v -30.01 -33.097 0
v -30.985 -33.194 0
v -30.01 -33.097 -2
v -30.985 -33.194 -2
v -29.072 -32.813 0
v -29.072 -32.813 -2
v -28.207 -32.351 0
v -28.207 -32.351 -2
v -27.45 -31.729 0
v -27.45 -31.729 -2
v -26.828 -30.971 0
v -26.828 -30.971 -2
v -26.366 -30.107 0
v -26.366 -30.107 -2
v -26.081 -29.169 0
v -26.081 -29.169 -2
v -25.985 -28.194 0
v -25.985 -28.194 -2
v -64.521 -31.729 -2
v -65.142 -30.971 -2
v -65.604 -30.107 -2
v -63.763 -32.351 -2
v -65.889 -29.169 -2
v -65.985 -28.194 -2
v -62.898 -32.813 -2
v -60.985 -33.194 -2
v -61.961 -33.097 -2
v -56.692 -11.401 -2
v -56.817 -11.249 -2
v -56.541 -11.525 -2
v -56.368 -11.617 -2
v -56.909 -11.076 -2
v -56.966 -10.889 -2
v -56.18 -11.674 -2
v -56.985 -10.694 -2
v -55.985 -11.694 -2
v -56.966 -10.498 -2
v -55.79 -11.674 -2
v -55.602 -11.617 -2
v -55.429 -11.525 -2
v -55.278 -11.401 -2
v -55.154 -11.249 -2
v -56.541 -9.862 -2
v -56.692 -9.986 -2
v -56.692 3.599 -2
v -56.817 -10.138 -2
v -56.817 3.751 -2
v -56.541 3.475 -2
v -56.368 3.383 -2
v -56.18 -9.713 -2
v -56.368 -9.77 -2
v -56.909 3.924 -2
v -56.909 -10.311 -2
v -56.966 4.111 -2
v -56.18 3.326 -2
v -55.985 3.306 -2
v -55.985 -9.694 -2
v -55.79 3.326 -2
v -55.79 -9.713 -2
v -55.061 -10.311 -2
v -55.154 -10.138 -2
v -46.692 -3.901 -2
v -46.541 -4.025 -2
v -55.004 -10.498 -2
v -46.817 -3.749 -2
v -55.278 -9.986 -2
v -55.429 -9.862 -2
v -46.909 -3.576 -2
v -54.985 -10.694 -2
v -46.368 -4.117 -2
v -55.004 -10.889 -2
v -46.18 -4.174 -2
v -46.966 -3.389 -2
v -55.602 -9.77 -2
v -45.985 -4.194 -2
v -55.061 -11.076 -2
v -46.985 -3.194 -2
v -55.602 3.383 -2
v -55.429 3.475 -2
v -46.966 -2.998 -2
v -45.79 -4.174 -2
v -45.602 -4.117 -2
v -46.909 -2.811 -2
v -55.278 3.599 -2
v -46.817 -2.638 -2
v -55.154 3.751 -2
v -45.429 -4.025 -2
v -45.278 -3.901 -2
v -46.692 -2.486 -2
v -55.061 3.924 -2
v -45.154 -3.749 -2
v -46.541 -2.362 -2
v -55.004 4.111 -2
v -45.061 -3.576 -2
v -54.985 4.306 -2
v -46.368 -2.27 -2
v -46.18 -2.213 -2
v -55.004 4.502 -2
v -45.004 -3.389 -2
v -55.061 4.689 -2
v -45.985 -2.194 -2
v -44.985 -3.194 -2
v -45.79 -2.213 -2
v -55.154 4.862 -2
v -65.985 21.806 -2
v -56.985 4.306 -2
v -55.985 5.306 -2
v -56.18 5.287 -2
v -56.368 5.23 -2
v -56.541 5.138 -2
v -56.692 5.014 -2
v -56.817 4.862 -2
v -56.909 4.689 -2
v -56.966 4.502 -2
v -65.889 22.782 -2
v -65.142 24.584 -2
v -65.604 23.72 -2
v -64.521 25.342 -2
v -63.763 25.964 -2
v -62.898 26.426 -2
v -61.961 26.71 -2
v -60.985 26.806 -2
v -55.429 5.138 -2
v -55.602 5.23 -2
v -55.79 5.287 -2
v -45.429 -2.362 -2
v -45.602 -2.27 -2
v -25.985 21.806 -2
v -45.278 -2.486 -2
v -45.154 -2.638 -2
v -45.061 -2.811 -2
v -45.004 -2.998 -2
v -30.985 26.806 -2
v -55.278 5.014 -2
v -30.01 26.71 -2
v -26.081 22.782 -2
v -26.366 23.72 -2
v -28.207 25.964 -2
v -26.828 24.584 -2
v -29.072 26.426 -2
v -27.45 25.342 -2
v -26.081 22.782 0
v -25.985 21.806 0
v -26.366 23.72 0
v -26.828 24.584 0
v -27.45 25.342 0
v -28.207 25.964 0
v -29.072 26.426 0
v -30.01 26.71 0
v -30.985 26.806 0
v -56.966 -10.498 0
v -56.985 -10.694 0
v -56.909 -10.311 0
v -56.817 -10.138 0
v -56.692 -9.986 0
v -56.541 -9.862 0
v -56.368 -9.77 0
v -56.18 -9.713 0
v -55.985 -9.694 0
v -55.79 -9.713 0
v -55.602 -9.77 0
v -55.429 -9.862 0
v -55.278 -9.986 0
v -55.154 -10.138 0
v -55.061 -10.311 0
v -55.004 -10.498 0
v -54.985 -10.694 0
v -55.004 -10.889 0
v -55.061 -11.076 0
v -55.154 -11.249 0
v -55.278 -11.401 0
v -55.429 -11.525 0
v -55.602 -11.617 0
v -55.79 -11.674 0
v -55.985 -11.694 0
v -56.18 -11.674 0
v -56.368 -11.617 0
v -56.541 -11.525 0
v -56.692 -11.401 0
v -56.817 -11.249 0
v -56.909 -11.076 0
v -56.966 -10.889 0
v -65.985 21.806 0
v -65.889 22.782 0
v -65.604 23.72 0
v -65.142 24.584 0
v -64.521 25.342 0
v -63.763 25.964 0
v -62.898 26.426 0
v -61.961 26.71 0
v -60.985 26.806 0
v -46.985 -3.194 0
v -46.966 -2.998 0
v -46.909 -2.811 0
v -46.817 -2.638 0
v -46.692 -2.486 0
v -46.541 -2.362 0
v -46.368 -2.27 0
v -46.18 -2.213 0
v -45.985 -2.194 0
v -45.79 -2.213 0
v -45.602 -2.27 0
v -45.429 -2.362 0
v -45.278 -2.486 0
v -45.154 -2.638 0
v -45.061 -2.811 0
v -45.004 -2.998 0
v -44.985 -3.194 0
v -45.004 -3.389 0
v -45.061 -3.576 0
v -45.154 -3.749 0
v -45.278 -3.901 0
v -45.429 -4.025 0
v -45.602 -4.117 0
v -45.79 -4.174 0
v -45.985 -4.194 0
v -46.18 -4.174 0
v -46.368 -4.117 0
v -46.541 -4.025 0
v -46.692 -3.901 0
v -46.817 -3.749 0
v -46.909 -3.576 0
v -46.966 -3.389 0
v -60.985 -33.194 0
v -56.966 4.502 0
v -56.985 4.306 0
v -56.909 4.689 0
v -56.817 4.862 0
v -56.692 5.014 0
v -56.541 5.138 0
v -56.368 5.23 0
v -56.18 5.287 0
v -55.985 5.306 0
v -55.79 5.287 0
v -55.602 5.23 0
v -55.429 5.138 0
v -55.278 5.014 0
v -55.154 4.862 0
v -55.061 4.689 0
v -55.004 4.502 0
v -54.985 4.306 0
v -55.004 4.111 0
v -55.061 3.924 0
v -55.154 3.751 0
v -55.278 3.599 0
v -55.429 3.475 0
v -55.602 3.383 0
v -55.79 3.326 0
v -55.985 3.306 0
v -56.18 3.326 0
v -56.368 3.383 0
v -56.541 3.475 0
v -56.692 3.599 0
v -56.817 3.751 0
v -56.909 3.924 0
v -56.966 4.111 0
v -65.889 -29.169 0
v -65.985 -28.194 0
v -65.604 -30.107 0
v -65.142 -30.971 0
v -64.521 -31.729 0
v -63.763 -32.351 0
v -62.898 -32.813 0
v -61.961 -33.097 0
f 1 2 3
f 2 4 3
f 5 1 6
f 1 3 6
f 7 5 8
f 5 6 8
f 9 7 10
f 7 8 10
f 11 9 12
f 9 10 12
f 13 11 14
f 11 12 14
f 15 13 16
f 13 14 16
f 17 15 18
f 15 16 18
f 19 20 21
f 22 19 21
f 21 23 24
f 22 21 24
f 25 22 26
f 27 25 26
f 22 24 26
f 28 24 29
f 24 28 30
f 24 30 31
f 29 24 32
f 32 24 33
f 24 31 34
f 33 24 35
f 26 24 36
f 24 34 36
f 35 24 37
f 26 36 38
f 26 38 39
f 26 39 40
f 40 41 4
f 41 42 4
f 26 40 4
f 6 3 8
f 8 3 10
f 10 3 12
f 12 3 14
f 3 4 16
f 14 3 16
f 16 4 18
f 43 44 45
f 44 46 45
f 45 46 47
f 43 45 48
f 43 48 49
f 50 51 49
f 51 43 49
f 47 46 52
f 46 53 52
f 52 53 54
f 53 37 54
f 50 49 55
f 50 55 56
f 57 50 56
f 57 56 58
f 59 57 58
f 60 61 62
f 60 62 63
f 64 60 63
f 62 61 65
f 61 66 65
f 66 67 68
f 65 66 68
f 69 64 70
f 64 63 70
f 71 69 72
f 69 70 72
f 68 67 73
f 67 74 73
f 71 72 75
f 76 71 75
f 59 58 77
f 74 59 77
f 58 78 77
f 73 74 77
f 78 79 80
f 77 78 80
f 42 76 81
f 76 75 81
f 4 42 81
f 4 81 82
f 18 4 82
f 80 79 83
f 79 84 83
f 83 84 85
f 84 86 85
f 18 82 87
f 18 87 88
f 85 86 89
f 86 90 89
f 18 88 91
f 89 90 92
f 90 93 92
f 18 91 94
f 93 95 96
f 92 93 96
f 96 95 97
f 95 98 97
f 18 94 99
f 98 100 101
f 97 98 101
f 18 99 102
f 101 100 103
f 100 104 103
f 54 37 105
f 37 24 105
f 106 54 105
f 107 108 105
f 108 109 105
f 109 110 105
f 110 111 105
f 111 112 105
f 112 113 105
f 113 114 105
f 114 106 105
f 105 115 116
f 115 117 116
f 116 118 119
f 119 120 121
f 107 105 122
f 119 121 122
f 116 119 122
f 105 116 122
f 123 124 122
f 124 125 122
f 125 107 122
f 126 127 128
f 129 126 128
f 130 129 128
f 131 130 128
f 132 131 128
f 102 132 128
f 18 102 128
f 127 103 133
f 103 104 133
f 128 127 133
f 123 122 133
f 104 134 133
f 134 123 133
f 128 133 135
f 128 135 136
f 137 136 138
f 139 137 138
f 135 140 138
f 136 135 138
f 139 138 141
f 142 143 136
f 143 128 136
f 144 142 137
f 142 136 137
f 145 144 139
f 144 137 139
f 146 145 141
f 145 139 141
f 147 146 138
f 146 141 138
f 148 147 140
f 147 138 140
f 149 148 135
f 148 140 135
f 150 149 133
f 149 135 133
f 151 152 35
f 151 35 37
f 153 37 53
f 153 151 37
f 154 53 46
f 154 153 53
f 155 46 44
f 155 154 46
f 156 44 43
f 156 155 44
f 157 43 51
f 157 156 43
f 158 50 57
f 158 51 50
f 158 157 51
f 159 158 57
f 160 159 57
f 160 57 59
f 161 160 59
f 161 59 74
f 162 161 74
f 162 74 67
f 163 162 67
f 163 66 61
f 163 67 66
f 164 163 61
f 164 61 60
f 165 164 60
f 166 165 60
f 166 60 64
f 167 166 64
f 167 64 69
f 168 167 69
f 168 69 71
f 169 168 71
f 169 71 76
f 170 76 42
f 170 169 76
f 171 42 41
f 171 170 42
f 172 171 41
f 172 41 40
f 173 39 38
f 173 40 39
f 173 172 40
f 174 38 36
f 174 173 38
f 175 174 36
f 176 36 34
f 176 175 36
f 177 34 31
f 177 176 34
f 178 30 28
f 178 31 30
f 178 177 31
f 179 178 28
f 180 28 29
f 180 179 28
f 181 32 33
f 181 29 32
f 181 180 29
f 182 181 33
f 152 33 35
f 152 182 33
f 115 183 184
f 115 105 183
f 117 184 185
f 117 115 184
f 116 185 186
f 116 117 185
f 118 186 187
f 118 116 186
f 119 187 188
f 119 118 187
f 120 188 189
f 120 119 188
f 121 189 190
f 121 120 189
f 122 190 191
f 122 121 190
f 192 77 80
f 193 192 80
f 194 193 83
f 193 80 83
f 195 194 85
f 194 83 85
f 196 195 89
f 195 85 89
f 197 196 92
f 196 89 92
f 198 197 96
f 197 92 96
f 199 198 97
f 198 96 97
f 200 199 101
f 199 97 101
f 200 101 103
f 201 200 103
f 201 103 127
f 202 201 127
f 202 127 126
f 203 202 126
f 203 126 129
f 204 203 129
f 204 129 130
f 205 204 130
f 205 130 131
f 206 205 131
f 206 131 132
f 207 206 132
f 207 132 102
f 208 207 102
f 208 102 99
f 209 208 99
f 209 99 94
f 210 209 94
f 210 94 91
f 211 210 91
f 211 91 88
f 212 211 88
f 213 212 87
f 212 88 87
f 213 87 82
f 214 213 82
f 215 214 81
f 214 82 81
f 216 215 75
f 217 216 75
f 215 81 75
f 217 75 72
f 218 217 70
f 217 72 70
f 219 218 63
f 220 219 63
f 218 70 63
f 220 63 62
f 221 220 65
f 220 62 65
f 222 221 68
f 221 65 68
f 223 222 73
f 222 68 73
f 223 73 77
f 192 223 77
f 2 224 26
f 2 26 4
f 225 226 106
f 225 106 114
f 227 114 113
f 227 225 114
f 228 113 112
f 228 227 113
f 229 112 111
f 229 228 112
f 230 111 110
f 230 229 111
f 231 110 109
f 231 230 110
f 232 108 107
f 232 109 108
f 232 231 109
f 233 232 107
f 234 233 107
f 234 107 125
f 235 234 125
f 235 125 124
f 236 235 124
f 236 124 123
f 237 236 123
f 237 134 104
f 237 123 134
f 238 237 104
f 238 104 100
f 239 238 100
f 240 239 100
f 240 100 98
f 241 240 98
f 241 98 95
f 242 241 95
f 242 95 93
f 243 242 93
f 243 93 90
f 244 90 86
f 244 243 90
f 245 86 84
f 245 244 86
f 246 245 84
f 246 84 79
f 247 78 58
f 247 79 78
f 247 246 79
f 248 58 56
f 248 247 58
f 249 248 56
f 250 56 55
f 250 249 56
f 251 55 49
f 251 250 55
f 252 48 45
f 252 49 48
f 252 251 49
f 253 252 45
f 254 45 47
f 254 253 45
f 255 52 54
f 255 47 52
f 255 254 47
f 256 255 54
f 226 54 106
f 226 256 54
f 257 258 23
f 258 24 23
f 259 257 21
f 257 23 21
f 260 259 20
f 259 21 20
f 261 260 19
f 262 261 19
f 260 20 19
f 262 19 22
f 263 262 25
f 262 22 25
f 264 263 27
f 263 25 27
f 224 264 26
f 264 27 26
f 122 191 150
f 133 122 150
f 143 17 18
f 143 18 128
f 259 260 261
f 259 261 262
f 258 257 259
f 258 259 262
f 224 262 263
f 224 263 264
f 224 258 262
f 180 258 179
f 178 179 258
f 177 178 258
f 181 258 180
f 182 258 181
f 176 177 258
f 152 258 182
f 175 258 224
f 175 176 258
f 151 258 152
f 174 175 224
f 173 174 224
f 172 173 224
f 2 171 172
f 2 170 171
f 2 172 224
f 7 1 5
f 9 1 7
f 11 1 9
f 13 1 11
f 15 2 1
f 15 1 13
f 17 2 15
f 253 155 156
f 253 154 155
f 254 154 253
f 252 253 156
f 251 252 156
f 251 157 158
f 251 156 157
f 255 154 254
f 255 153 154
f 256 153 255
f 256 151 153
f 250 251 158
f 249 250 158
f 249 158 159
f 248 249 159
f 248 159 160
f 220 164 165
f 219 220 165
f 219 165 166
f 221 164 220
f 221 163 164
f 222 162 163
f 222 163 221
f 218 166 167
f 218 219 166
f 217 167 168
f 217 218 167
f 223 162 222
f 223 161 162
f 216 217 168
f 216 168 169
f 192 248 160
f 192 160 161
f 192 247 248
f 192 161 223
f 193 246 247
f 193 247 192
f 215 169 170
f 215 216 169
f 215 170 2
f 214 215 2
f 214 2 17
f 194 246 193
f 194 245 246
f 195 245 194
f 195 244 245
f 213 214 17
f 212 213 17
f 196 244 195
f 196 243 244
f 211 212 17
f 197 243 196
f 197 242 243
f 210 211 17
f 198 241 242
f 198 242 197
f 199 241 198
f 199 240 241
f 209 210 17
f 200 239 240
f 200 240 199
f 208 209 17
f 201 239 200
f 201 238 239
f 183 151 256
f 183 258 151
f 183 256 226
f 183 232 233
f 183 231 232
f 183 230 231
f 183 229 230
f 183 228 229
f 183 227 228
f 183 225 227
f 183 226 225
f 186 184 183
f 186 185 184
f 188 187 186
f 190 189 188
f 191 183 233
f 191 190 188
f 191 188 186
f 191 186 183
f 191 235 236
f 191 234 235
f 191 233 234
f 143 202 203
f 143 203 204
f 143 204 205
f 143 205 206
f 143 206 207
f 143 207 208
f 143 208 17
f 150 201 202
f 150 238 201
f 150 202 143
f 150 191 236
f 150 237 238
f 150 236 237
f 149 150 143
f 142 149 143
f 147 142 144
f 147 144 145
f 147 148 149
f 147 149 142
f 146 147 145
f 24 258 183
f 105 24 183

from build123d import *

# Parameters (mm, degrees)
SKETCH1_W               = 40
SKETCH1_H               = 60
BOSS_EXTRUDE4_DEPTH     = 2
FILLET1_R               = 5
SKETCH12_R              = 1
CUT_EXTRUDE6_DEPTH      = 12
CUT_EXTRUDE7_DEPTH      = 8
CUT_EXTRUDE7_DEPTH_BACK = 10
SKETCH13_R              = 1


with BuildPart() as part:
    # Sketch1 → Boss-Extrude4 (new body)
    with BuildSketch(Plane.XY):
        with Locations((-45.9850693, -3.193565597)):
            Rectangle(SKETCH1_W, SKETCH1_H)
    extrude(amount=-BOSS_EXTRUDE4_DEPTH)

    # Fillet1
    fillet1_edges = [part.edges().sort_by_distance(p)[0] for p in [
        (-65.9850693, 26.806434403, -1),
        (-65.9850693, -33.193565597, -1),
        (-25.9850693, -33.193565597, -1),
        (-25.9850693, 26.806434403, -1),
    ]]
    fillet(fillet1_edges, radius=FILLET1_R)

    # Sketch12 → Cut-Extrude6 (cut)
    with BuildSketch(Plane(origin=(0, 0, -2), x_dir=(-1, 0, 0), z_dir=(0, 0, -1))):
        with Locations((45.9850693, -3.193565597)):
            Circle(SKETCH12_R)
    extrude(amount=-CUT_EXTRUDE6_DEPTH, mode=Mode.SUBTRACT)

    # Sketch13 → Cut-Extrude7 (cut, two sides: drawn at the far end of the back side and taken through both)
    with BuildSketch(Plane(origin=(0, 0, -2), x_dir=(-1, 0, 0), z_dir=(0, 0, -1)).offset(-CUT_EXTRUDE7_DEPTH_BACK)):
        with Locations((55.9850693, 4.306434403)):
            Circle(SKETCH13_R)
        with Locations((55.9850693, -10.693565597)):
            Circle(SKETCH13_R)
    extrude(amount=CUT_EXTRUDE7_DEPTH + CUT_EXTRUDE7_DEPTH_BACK, mode=Mode.SUBTRACT)


solid = part.part
